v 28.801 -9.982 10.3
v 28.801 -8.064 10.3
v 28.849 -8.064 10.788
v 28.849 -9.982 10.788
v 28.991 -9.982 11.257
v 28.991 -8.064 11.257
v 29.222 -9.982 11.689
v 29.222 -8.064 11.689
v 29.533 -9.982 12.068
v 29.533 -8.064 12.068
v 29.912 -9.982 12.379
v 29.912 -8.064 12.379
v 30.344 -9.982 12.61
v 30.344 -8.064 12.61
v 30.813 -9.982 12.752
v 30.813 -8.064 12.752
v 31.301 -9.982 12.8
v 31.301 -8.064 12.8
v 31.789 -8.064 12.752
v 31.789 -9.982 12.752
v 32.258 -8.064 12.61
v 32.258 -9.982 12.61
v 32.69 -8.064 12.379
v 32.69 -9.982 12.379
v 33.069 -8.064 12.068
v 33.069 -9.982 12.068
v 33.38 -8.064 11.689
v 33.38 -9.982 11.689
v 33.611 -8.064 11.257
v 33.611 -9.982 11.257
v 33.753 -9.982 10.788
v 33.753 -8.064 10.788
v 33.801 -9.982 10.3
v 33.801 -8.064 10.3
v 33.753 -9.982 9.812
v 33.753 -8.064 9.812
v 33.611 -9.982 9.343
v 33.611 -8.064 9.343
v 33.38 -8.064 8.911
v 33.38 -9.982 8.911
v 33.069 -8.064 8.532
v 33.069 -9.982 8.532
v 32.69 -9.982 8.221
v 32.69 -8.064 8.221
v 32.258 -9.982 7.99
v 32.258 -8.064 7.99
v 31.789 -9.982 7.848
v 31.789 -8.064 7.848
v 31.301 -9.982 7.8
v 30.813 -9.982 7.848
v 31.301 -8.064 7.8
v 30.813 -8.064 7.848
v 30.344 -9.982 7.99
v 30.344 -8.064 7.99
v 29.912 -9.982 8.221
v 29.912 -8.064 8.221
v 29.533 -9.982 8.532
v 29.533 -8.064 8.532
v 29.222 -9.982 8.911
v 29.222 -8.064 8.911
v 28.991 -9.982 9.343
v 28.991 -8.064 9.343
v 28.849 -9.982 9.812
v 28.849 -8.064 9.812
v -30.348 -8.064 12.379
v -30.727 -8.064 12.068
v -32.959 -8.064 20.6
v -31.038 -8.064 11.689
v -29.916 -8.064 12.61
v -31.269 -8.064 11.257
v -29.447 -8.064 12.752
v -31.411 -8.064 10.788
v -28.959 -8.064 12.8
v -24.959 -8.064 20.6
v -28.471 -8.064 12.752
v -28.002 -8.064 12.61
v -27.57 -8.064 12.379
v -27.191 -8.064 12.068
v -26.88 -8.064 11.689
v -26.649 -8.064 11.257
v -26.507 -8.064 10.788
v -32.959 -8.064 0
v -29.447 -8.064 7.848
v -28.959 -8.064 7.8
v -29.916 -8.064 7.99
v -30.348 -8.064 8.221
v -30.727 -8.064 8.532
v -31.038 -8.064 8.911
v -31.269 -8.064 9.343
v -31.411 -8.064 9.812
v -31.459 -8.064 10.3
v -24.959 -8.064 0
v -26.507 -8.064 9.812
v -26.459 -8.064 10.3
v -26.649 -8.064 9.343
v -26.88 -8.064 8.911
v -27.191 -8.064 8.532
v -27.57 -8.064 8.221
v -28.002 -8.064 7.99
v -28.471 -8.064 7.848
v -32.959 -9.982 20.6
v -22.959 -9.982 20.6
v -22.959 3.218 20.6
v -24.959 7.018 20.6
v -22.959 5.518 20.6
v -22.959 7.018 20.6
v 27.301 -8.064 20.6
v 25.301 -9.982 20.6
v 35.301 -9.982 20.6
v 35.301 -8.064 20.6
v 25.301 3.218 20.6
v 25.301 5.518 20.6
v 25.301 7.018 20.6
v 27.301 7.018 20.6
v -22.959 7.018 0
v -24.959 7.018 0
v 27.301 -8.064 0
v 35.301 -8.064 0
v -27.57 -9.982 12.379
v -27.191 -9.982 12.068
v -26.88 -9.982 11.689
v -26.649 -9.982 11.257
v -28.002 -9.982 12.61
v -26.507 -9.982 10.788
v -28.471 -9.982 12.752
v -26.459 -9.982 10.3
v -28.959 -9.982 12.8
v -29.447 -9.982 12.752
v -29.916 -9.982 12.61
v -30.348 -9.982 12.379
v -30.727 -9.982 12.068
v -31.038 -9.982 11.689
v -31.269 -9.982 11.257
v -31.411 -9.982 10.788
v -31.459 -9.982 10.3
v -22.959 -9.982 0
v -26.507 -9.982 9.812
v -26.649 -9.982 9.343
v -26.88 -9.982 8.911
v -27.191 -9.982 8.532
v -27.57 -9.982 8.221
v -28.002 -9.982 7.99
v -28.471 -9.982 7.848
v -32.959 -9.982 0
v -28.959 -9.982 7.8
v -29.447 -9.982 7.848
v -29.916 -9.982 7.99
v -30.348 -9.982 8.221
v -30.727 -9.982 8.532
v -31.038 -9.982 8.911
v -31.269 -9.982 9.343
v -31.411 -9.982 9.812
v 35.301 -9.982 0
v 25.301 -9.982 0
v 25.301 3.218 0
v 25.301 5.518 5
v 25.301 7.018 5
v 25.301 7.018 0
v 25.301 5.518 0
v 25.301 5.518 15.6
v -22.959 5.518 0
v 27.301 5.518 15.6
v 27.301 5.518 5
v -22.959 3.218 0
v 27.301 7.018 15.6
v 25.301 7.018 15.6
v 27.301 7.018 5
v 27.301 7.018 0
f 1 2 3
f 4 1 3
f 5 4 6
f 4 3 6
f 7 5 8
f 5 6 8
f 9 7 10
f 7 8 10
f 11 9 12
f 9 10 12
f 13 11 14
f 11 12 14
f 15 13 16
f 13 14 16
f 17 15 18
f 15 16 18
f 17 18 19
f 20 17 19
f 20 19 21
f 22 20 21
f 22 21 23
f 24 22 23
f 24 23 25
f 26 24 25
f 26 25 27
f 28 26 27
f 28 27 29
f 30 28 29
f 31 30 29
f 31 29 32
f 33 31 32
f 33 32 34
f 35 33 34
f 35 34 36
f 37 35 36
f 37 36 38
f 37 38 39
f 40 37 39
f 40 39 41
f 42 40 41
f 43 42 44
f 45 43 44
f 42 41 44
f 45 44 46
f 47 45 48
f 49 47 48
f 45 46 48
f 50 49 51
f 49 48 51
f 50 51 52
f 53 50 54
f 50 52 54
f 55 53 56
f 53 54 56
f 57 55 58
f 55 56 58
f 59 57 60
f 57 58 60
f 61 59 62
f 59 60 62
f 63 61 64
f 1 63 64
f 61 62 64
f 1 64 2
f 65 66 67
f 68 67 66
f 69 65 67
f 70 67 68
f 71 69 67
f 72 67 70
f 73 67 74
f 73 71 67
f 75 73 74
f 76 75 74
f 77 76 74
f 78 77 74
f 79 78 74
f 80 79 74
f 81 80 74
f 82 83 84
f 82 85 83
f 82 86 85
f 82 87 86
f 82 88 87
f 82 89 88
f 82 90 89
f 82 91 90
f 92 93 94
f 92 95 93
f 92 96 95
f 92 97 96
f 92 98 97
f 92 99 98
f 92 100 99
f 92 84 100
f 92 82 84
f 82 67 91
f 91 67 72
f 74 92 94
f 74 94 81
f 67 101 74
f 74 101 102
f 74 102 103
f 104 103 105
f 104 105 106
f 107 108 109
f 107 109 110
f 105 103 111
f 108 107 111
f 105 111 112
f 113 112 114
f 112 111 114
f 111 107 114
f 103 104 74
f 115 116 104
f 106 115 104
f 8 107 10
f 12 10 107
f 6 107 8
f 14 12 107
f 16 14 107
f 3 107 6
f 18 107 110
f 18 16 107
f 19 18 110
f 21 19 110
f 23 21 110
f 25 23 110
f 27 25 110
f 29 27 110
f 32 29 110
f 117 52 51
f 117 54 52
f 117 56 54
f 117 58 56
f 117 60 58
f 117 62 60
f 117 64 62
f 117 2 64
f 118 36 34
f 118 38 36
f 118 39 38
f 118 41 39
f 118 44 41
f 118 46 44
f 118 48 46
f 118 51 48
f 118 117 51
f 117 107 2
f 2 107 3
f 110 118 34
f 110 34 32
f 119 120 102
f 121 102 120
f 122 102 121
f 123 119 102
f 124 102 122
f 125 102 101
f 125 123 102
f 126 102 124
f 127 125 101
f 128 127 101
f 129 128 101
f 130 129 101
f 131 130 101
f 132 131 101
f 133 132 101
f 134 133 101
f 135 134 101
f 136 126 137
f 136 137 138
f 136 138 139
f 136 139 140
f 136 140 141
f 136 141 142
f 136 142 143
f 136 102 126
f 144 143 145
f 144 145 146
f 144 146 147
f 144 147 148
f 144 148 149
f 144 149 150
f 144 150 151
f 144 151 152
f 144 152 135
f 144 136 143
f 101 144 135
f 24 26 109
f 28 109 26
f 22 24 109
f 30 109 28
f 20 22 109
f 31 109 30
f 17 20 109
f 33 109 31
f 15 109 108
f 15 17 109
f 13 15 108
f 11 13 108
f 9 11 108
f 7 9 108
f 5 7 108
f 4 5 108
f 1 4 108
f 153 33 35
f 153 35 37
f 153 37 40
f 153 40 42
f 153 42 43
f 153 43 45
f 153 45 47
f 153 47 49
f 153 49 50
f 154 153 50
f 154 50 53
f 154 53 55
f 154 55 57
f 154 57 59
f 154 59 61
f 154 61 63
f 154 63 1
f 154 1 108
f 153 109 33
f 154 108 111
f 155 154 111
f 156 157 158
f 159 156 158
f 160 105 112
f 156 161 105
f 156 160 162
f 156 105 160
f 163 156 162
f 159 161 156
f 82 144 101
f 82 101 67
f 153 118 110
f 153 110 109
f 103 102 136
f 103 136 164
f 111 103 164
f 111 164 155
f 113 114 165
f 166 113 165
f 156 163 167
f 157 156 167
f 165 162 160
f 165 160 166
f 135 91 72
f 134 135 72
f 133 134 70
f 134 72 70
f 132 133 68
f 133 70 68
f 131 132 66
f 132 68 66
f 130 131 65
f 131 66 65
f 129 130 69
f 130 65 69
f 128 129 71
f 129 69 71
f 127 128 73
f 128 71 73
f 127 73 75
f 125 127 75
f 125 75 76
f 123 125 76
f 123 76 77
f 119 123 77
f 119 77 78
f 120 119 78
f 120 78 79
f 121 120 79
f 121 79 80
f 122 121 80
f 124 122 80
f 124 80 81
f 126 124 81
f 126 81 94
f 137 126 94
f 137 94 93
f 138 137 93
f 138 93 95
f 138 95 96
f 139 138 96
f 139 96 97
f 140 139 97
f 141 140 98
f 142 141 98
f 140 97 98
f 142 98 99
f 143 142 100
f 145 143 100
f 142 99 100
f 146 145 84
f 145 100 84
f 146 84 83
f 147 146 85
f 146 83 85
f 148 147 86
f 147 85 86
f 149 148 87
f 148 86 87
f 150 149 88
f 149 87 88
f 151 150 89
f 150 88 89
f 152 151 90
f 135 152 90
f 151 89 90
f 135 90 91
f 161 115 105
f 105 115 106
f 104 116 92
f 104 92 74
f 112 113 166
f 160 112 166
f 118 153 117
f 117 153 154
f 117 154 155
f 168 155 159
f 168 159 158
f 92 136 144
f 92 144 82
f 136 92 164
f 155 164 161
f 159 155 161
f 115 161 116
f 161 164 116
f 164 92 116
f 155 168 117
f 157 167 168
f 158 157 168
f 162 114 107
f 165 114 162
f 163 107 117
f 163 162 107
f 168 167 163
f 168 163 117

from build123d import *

# Parameters (mm, degrees)
RESSALTO_EXTRUS_O1_DEPTH = 20.6
ESBO_O2_W                = 48.26
ESBO_O2_H                = 13.2
CORTE_EXTRUS_O1_DEPTH    = 25.4
ESBO_O3_W                = 20.6
ESBO_O3_H                = 1.5
RESSALTO_EXTRUS_O2_DEPTH = 2
ESBO_O4_W                = 5
ESBO_O4_H                = 1.5
RESSALTO_EXTRUS_O3_DEPTH = 2
ESBO_O5_R                = 2.5
CORTE_EXTRUS_O2_DEPTH    = 2


with BuildPart() as part:
    # Esboço1 → Ressalto-extrusão1 (new body)
    with BuildSketch(Plane.XY):
        Polygon((35.300916774, -9.982051282), (-32.959083226, -9.982051282), (-32.959083226, -8.064102564), (-24.959083226, -8.064102564), (-24.959083226, 5.517948718), (27.300916774, 5.517948718), (27.300916774, -8.064102564), (35.300916774, -8.064102564), align=None)
    extrude(amount=RESSALTO_EXTRUS_O1_DEPTH)

    # Esboço2 → Corte-extrusão1 (cut)
    with BuildSketch(Plane.XY.offset(20.6)):
        with Locations((1.170916774, -3.382051282)):
            Rectangle(ESBO_O2_W, ESBO_O2_H)
    extrude(amount=-CORTE_EXTRUS_O1_DEPTH, mode=Mode.SUBTRACT)

    # Esboço3 → Ressalto-extrusão2 (add)
    with BuildSketch(Plane.ZY.offset(24.959083226)):
        with Locations((10.3, 6.267948718)):
            Rectangle(ESBO_O3_W, ESBO_O3_H)
    extrude(amount=-RESSALTO_EXTRUS_O2_DEPTH)

    # Esboço4 → Ressalto-extrusão3 (add)
    with BuildSketch(Plane(origin=(27.300916774, 0, 0), x_dir=(0, 0, -1), z_dir=(1, 0, 0))):
        with Locations((-18.1, 6.267948718)):
            Rectangle(ESBO_O4_W, ESBO_O4_H)
        with Locations((-2.5, 6.267948718)):
            Rectangle(ESBO_O4_W, ESBO_O4_H)
    extrude(amount=-RESSALTO_EXTRUS_O3_DEPTH)

    # Esboço5 → Corte-extrusão2 (cut)
    with BuildSketch(Plane(origin=(0, -8.064102564, 0), x_dir=(1, 0, 0), z_dir=(0, 1, 0))):
        with Locations(Location((-28.959083226, -10.3, 0), (0, 0, 180))):
            Circle(ESBO_O5_R)
        with Locations(Location((31.300916774, -10.3, 0), (0, 0, 180))):
            Circle(ESBO_O5_R)
    extrude(amount=-CORTE_EXTRUS_O2_DEPTH, mode=Mode.SUBTRACT)


solid = part.part
